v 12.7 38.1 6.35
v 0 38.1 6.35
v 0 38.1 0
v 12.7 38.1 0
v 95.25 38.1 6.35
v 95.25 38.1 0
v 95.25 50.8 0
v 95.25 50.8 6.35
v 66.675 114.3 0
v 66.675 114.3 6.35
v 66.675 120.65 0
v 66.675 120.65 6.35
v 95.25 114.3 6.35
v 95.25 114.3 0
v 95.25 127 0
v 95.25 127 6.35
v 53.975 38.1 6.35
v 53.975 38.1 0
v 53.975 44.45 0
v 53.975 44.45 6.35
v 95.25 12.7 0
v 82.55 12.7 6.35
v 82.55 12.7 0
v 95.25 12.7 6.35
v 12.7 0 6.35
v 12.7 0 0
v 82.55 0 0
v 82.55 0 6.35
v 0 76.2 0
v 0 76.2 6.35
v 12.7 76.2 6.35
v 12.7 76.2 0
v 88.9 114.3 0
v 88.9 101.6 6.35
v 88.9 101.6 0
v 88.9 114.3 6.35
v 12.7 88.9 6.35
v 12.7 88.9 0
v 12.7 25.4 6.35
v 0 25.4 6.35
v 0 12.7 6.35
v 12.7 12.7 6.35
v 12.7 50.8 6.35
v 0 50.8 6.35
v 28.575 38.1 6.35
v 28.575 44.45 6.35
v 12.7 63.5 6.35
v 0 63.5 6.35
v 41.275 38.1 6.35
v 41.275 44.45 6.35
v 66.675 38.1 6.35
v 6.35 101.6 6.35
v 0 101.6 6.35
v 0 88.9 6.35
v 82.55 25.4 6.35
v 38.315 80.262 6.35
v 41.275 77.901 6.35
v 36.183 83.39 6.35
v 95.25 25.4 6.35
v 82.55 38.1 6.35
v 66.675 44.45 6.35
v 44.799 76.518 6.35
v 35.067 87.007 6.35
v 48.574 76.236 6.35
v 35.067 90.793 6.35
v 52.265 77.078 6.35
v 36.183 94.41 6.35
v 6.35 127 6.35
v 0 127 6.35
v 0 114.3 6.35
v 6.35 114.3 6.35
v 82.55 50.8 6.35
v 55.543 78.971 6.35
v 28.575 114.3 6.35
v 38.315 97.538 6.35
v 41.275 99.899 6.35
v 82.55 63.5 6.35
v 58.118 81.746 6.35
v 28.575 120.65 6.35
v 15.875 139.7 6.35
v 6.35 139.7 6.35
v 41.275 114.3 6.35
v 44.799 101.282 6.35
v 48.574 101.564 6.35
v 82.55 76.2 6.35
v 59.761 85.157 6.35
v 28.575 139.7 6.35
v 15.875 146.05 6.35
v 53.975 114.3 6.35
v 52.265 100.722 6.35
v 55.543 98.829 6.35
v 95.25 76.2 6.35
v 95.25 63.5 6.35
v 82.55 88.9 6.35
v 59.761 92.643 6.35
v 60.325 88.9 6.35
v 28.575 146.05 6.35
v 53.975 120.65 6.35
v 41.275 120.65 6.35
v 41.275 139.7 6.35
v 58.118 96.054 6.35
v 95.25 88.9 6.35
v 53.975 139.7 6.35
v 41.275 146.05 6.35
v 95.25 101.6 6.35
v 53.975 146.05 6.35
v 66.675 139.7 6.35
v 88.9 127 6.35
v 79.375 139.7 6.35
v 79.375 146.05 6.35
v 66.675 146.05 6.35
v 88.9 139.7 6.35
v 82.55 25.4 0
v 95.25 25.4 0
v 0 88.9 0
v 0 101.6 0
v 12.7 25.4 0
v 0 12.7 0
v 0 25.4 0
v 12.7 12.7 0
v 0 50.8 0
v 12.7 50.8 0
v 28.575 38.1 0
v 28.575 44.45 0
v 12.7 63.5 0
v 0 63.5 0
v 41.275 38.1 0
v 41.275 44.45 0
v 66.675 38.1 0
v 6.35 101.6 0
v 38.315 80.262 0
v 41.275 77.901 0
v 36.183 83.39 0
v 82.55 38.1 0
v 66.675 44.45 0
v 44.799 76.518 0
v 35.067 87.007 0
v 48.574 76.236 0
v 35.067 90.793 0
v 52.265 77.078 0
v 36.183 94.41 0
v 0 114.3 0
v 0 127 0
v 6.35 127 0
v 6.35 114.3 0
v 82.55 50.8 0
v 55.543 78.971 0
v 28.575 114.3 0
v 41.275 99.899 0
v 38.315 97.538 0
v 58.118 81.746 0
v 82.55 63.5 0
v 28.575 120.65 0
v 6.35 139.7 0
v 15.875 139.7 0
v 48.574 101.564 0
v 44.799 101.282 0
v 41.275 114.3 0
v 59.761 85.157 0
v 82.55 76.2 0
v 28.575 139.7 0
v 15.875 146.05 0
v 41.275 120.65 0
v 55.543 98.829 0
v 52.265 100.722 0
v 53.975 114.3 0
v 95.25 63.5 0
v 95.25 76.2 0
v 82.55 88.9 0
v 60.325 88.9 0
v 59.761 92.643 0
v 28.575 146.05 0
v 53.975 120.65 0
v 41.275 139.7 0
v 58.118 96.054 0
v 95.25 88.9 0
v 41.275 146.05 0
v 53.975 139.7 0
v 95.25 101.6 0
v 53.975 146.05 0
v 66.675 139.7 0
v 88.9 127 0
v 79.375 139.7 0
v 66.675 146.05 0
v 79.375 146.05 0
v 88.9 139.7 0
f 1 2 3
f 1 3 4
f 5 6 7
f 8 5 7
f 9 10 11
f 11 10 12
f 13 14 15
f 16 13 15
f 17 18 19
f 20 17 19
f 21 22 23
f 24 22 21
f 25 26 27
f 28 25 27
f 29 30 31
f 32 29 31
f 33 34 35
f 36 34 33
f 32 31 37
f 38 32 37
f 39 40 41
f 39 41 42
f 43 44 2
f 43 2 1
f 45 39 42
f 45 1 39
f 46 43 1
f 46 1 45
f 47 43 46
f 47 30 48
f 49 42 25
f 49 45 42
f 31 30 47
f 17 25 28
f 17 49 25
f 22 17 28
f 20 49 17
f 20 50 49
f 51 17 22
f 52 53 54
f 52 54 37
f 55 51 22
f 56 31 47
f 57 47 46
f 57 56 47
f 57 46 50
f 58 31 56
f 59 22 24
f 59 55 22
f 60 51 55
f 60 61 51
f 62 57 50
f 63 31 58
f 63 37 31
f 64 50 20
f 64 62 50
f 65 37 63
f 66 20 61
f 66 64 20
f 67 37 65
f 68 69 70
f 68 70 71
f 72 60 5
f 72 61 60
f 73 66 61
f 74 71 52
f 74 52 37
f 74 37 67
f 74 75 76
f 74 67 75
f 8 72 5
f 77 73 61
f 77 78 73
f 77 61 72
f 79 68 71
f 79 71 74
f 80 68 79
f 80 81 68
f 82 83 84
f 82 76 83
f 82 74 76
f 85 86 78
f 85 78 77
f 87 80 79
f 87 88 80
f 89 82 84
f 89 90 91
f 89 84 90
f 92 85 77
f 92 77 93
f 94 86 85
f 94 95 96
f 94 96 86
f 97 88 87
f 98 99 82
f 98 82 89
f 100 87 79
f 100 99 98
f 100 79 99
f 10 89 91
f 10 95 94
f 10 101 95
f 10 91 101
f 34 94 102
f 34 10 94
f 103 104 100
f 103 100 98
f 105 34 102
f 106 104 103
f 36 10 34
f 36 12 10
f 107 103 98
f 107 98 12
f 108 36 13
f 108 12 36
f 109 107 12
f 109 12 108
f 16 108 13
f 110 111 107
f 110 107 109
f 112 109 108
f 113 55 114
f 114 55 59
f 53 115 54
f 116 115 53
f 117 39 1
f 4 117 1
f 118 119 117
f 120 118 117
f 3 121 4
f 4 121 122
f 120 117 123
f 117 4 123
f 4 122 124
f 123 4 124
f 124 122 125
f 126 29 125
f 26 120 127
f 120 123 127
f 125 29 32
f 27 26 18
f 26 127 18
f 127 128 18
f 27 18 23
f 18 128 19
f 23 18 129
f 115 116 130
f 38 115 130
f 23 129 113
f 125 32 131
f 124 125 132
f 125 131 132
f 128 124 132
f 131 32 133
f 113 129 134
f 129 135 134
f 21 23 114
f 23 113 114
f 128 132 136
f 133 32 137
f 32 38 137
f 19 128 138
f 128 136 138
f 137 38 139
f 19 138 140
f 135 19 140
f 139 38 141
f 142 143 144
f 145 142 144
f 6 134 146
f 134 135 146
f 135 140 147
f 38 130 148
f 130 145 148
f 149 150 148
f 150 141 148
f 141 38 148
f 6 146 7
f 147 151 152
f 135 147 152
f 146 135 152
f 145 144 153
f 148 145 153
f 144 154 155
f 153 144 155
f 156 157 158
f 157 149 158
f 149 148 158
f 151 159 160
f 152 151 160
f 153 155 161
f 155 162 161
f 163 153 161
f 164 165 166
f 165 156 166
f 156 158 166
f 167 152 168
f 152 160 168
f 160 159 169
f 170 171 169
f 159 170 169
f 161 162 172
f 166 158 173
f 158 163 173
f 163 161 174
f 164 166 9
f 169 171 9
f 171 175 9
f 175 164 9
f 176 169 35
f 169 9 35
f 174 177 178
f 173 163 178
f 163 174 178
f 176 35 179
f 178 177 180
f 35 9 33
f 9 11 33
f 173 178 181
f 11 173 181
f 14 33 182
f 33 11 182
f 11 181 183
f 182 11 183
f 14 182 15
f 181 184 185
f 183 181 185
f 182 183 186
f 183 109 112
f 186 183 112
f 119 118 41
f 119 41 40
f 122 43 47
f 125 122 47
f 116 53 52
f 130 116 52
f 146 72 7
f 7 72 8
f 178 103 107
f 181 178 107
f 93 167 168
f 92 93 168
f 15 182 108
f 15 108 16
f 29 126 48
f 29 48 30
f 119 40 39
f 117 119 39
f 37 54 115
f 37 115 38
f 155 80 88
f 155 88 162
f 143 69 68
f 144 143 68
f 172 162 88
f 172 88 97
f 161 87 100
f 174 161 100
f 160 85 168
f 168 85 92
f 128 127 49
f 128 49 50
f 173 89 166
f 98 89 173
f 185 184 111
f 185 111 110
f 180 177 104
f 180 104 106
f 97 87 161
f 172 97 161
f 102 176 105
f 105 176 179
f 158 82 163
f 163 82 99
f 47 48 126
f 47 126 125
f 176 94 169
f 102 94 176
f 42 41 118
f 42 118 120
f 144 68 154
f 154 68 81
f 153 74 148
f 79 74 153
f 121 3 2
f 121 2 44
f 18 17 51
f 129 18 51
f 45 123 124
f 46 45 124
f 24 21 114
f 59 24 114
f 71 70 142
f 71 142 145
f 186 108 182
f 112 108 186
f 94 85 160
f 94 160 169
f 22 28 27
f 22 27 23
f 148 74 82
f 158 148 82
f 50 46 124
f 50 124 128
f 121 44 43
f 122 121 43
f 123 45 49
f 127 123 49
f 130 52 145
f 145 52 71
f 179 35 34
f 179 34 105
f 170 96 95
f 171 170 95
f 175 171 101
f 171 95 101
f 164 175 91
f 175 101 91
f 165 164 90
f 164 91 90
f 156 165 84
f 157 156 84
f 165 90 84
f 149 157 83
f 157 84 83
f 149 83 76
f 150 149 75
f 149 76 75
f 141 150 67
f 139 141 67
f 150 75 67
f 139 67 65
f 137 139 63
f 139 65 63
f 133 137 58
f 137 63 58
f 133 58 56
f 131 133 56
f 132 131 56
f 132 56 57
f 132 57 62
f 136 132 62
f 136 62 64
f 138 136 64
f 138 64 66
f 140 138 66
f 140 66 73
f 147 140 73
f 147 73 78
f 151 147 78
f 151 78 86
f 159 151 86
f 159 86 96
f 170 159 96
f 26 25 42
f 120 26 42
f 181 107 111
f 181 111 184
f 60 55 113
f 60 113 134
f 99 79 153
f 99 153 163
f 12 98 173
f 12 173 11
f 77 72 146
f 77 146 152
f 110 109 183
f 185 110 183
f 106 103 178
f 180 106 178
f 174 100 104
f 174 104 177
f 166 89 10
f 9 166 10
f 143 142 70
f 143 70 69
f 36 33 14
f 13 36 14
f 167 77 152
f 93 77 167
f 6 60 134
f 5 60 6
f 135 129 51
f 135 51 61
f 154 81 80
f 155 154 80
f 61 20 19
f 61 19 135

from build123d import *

# Parameters (mm, degrees)
SKETCH1_W           = 95.25
SKETCH1_H           = 177.8
BOSS_EXTRUDE1_DEPTH = 6.35
SKETCH2_W           = 12.7
SKETCH2_H           = 12.7
CUT_EXTRUDE1_DEPTH  = 7.35
LPATTERN1_COUNT     = 4
LPATTERN1_PITCH     = 25.4
SKETCH3_W           = 12.7
SKETCH3_H           = 6.35
CUT_EXTRUDE2_DEPTH  = 7.35
SKETCH5_W           = 6.35
SKETCH5_H           = 12.7
CUT_EXTRUDE4_DEPTH  = 7.35
LPATTERN2_COUNT     = 4
LPATTERN2_PITCH     = 25.4
SKETCH6_W           = 95.25
SKETCH6_H           = 38.1
CUT_EXTRUDE5_DEPTH  = 7.35
SKETCH7_W           = 12.7
SKETCH7_H           = 6.35
BOSS_EXTRUDE2_DEPTH = 6.35
LPATTERN3_COUNT     = 2
LPATTERN3_PITCH     = 25.4
LPATTERN3_COL_COUNT = 2
LPATTERN3_COL_PITCH = 25.4
LPATTERN4_COUNT     = 2
LPATTERN4_PITCH     = 76.2
SKETCH8_R           = 12.7
CUT_EXTRUDE6_DEPTH  = 7.35


with BuildPart() as part:
    # Sketch1 → Boss-Extrude1 (new body)
    with BuildSketch(Plane.XY):
        with Locations((47.625, 88.9)):
            Rectangle(SKETCH1_W, SKETCH1_H)
    extrude(amount=BOSS_EXTRUDE1_DEPTH)

    # Sketch2 → Cut-Extrude1 (cut, through all)
    with BuildSketch(Plane.XY.offset(6.35)):
        with Locations((6.35, 6.35)):
            Rectangle(SKETCH2_W, SKETCH2_H)
        with Locations((88.9, 6.35)):
            Rectangle(SKETCH2_W, SKETCH2_H)
    cut_extrude1 = extrude(amount=-CUT_EXTRUDE1_DEPTH, mode=Mode.SUBTRACT)

    # LPattern1: Cut-Extrude1 ×4
    with Locations(*[(0, i * LPATTERN1_PITCH, 0) for i in range(1, LPATTERN1_COUNT)]):
        add(cut_extrude1, mode=Mode.SUBTRACT)

    # Sketch3 → Cut-Extrude2 (cut, through all)
    with BuildSketch(Plane.XY.offset(6.35)):
        with Locations((34.925, 41.275)):
            Rectangle(SKETCH3_W, SKETCH3_H)
        with Locations((60.325, 41.275)):
            Rectangle(SKETCH3_W, SKETCH3_H)
    cut_extrude2 = extrude(amount=-CUT_EXTRUDE2_DEPTH, mode=Mode.SUBTRACT)

    # Sketch5 → Cut-Extrude4 (cut, through all)
    with BuildSketch(Plane.XY.offset(6.35)):
        with Locations((3.175, 107.95)):
            Rectangle(SKETCH5_W, SKETCH5_H)
        with Locations((92.075, 107.95)):
            Rectangle(SKETCH5_W, SKETCH5_H)
    cut_extrude4 = extrude(amount=-CUT_EXTRUDE4_DEPTH, mode=Mode.SUBTRACT)

    # LPattern2: Cut-Extrude4 ×4
    with Locations(*[(0, i * LPATTERN2_PITCH, 0) for i in range(1, LPATTERN2_COUNT)]):
        add(cut_extrude4, mode=Mode.SUBTRACT)

    # Sketch6 → Cut-Extrude5 (cut, through all)
    with BuildSketch(Plane.XY.offset(6.35)):
        with Locations((47.625, 158.75)):
            Rectangle(SKETCH6_W, SKETCH6_H)
    extrude(amount=-CUT_EXTRUDE5_DEPTH, mode=Mode.SUBTRACT)

    # Sketch7 → Boss-Extrude2 (add)
    with BuildSketch(Plane(origin=(0, 139.7, 0), x_dir=(1, 0, 0), z_dir=(0, 1, 0))):
        with Locations((47.625, -3.175)):
            Rectangle(SKETCH7_W, SKETCH7_H)
    boss_extrude2 = extrude(amount=BOSS_EXTRUDE2_DEPTH)

    # LPattern3: Boss-Extrude2 ×2
    with Locations(*[(i * LPATTERN3_PITCH, 0, 0) for i in range(1, LPATTERN3_COUNT)]):
        add(boss_extrude2)

    # LPattern3 col: Boss-Extrude2 ×2
    with Locations(*[(-i * LPATTERN3_COL_PITCH, 0, 0) for i in range(1, LPATTERN3_COL_COUNT)]):
        add(boss_extrude2)

    # LPattern4: Cut-Extrude2 ×2
    with Locations(*[(0, i * LPATTERN4_PITCH, 0) for i in range(1, LPATTERN4_COUNT)]):
        add(cut_extrude2, mode=Mode.SUBTRACT)

    # Sketch8 → Cut-Extrude6 (cut, through all)
    with BuildSketch(Plane.XY.offset(6.35)):
        with Locations((47.625, 88.9)):
            Circle(SKETCH8_R)
    extrude(amount=-CUT_EXTRUDE6_DEPTH, mode=Mode.SUBTRACT)


solid = part.part
